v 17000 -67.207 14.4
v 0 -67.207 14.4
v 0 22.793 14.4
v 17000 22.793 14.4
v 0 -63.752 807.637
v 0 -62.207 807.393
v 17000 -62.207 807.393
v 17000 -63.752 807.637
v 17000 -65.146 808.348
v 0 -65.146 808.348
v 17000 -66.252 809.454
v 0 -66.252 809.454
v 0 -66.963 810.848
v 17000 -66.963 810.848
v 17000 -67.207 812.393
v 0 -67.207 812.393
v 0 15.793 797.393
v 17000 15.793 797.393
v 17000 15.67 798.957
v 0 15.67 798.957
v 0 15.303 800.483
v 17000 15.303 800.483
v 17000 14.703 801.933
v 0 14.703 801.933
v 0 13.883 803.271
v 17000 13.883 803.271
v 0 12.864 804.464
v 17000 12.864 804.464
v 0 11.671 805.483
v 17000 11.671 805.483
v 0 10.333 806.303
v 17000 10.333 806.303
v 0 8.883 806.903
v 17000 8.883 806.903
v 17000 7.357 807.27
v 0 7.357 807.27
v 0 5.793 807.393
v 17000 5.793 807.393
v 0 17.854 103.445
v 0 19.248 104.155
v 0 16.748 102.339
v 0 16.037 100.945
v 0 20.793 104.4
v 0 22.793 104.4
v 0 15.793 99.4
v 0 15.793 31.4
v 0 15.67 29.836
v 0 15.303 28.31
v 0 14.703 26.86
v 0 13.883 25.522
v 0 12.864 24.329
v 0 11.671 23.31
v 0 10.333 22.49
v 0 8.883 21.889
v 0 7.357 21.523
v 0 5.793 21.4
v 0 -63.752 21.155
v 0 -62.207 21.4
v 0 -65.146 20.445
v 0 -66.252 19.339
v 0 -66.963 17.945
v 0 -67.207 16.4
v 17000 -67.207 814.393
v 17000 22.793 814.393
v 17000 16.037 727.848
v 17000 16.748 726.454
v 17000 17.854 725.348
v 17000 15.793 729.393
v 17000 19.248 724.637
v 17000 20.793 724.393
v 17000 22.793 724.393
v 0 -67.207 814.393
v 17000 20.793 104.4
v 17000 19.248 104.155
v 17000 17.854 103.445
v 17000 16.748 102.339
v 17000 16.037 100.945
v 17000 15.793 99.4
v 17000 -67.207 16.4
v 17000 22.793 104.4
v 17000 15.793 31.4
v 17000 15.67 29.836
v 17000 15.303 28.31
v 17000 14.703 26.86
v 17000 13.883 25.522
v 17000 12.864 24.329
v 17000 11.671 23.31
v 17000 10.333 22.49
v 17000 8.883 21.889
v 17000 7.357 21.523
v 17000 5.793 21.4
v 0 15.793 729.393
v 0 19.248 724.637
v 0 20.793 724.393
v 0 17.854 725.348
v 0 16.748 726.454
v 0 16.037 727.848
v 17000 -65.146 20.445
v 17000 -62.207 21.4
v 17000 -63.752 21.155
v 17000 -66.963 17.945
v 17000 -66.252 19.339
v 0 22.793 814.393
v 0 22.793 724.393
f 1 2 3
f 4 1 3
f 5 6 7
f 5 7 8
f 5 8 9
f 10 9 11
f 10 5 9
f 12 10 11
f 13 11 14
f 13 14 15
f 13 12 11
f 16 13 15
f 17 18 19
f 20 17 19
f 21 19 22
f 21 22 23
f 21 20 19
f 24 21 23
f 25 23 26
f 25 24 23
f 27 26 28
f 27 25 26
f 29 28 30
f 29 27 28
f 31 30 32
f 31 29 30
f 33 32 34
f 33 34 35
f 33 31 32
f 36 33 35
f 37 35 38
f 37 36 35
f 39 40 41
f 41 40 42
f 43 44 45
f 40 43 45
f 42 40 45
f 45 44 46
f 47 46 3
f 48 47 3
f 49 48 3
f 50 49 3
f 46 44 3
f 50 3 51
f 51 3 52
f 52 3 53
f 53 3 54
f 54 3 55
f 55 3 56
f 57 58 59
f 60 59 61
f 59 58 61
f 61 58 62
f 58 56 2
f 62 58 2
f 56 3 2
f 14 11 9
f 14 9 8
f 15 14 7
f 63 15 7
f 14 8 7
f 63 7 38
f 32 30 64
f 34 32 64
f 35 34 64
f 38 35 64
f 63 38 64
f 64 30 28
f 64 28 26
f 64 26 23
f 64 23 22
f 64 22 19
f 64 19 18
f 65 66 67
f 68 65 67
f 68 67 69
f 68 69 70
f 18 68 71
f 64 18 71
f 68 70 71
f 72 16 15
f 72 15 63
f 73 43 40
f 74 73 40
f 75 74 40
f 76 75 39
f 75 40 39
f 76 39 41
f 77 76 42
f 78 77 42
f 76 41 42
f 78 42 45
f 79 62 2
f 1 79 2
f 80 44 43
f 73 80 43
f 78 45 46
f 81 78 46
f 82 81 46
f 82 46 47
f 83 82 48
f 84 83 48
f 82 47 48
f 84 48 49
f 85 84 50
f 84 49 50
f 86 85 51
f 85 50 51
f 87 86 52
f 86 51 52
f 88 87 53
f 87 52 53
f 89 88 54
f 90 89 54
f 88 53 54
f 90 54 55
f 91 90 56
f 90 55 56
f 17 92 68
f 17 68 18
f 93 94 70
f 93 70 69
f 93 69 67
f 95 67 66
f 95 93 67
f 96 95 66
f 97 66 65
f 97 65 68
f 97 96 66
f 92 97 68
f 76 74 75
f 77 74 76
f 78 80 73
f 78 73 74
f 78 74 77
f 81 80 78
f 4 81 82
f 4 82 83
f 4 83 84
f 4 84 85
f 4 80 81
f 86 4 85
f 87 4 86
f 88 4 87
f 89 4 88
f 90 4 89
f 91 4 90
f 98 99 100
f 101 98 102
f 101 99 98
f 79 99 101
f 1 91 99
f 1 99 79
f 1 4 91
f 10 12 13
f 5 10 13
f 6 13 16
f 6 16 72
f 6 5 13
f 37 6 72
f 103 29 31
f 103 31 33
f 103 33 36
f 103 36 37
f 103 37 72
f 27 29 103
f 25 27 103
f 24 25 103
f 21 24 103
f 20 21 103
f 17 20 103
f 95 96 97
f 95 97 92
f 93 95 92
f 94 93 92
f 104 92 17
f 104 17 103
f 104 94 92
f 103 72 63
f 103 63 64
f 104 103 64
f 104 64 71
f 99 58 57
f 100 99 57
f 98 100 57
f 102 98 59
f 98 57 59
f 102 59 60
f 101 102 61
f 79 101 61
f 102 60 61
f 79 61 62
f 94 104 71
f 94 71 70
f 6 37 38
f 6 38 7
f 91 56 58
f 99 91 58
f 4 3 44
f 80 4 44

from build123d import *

# Parameters (mm, degrees)
EXTRUDE017_DEPTH = 17000
EXTRUDE018_DEPTH = 17000


with BuildPart() as extrude017:
    # AngleSteel004 → Extrude017 (new body)
    with BuildSketch(Plane(origin=(0, 53.415282, 39.015282), x_dir=(0, 1, 0), z_dir=(-1, 0, 0))):
        with BuildLine():
            Line((-24.615282, 24.615282), (-24.615282, -65.384718))
            Line((-24.615282, -65.384718), (-22.615282, -65.384718))
            ThreePointArc((-22.615282, -65.384718), (-19.079748, -63.920252), (-17.615282, -60.384718))
            Line((-17.615282, -60.384718), (-17.615282, 7.615282))
            ThreePointArc((-17.615282, 7.615282), (-14.68635, 14.68635), (-7.615282, 17.615282))
            Line((-7.615282, 17.615282), (60.384718, 17.615282))
            ThreePointArc((60.384718, 17.615282), (63.920252, 19.079748), (65.384718, 22.615282))
            Line((65.384718, 22.615282), (65.384718, 24.615282))
            Line((65.384718, 24.615282), (-24.615282, 24.615282))
        make_face()
    extrude(amount=-EXTRUDE017_DEPTH)


with BuildPart() as fusion001:
    # Mirror → Extrude018 (new body)
    with BuildSketch(Plane(origin=(0, 53.415282, 789.777402), x_dir=(0, -1, 0), z_dir=(1, 0, 0))):
        with BuildLine():
            Line((24.615282, -24.615282), (24.615282, 65.384718))
            Line((24.615282, 65.384718), (22.615282, 65.384718))
            ThreePointArc((22.615282, 65.384718), (19.079748, 63.920252), (17.615282, 60.384718))
            Line((17.615282, 60.384718), (17.615282, -7.615282))
            ThreePointArc((17.615282, -7.615282), (14.68635, -14.68635), (7.615282, -17.615282))
            Line((7.615282, -17.615282), (-60.384718, -17.615282))
            ThreePointArc((-60.384718, -17.615282), (-63.920252, -19.079748), (-65.384718, -22.615282))
            Line((-65.384718, -22.615282), (-65.384718, -24.615282))
            Line((-65.384718, -24.615282), (24.615282, -24.615282))
        make_face()
    extrude(amount=EXTRUDE018_DEPTH)

    # Fusion001: union Extrude017
    add(extrude017.part)


with BuildPart() as fusion_mirrored:
    # Mirror001: instance of Fusion001
    add(fusion001.part.mirror(Plane(origin=(0, 28.796342, 514.396342), x_dir=(-1, 0, 0), z_dir=(0, -1, 0))))


with BuildPart() as fusion_mirrored_1:
    # Mirror001 placement: moved
    add(fusion_mirrored.part.moved(Location((0, -6, 0))))


solid = fusion_mirrored_1.part
